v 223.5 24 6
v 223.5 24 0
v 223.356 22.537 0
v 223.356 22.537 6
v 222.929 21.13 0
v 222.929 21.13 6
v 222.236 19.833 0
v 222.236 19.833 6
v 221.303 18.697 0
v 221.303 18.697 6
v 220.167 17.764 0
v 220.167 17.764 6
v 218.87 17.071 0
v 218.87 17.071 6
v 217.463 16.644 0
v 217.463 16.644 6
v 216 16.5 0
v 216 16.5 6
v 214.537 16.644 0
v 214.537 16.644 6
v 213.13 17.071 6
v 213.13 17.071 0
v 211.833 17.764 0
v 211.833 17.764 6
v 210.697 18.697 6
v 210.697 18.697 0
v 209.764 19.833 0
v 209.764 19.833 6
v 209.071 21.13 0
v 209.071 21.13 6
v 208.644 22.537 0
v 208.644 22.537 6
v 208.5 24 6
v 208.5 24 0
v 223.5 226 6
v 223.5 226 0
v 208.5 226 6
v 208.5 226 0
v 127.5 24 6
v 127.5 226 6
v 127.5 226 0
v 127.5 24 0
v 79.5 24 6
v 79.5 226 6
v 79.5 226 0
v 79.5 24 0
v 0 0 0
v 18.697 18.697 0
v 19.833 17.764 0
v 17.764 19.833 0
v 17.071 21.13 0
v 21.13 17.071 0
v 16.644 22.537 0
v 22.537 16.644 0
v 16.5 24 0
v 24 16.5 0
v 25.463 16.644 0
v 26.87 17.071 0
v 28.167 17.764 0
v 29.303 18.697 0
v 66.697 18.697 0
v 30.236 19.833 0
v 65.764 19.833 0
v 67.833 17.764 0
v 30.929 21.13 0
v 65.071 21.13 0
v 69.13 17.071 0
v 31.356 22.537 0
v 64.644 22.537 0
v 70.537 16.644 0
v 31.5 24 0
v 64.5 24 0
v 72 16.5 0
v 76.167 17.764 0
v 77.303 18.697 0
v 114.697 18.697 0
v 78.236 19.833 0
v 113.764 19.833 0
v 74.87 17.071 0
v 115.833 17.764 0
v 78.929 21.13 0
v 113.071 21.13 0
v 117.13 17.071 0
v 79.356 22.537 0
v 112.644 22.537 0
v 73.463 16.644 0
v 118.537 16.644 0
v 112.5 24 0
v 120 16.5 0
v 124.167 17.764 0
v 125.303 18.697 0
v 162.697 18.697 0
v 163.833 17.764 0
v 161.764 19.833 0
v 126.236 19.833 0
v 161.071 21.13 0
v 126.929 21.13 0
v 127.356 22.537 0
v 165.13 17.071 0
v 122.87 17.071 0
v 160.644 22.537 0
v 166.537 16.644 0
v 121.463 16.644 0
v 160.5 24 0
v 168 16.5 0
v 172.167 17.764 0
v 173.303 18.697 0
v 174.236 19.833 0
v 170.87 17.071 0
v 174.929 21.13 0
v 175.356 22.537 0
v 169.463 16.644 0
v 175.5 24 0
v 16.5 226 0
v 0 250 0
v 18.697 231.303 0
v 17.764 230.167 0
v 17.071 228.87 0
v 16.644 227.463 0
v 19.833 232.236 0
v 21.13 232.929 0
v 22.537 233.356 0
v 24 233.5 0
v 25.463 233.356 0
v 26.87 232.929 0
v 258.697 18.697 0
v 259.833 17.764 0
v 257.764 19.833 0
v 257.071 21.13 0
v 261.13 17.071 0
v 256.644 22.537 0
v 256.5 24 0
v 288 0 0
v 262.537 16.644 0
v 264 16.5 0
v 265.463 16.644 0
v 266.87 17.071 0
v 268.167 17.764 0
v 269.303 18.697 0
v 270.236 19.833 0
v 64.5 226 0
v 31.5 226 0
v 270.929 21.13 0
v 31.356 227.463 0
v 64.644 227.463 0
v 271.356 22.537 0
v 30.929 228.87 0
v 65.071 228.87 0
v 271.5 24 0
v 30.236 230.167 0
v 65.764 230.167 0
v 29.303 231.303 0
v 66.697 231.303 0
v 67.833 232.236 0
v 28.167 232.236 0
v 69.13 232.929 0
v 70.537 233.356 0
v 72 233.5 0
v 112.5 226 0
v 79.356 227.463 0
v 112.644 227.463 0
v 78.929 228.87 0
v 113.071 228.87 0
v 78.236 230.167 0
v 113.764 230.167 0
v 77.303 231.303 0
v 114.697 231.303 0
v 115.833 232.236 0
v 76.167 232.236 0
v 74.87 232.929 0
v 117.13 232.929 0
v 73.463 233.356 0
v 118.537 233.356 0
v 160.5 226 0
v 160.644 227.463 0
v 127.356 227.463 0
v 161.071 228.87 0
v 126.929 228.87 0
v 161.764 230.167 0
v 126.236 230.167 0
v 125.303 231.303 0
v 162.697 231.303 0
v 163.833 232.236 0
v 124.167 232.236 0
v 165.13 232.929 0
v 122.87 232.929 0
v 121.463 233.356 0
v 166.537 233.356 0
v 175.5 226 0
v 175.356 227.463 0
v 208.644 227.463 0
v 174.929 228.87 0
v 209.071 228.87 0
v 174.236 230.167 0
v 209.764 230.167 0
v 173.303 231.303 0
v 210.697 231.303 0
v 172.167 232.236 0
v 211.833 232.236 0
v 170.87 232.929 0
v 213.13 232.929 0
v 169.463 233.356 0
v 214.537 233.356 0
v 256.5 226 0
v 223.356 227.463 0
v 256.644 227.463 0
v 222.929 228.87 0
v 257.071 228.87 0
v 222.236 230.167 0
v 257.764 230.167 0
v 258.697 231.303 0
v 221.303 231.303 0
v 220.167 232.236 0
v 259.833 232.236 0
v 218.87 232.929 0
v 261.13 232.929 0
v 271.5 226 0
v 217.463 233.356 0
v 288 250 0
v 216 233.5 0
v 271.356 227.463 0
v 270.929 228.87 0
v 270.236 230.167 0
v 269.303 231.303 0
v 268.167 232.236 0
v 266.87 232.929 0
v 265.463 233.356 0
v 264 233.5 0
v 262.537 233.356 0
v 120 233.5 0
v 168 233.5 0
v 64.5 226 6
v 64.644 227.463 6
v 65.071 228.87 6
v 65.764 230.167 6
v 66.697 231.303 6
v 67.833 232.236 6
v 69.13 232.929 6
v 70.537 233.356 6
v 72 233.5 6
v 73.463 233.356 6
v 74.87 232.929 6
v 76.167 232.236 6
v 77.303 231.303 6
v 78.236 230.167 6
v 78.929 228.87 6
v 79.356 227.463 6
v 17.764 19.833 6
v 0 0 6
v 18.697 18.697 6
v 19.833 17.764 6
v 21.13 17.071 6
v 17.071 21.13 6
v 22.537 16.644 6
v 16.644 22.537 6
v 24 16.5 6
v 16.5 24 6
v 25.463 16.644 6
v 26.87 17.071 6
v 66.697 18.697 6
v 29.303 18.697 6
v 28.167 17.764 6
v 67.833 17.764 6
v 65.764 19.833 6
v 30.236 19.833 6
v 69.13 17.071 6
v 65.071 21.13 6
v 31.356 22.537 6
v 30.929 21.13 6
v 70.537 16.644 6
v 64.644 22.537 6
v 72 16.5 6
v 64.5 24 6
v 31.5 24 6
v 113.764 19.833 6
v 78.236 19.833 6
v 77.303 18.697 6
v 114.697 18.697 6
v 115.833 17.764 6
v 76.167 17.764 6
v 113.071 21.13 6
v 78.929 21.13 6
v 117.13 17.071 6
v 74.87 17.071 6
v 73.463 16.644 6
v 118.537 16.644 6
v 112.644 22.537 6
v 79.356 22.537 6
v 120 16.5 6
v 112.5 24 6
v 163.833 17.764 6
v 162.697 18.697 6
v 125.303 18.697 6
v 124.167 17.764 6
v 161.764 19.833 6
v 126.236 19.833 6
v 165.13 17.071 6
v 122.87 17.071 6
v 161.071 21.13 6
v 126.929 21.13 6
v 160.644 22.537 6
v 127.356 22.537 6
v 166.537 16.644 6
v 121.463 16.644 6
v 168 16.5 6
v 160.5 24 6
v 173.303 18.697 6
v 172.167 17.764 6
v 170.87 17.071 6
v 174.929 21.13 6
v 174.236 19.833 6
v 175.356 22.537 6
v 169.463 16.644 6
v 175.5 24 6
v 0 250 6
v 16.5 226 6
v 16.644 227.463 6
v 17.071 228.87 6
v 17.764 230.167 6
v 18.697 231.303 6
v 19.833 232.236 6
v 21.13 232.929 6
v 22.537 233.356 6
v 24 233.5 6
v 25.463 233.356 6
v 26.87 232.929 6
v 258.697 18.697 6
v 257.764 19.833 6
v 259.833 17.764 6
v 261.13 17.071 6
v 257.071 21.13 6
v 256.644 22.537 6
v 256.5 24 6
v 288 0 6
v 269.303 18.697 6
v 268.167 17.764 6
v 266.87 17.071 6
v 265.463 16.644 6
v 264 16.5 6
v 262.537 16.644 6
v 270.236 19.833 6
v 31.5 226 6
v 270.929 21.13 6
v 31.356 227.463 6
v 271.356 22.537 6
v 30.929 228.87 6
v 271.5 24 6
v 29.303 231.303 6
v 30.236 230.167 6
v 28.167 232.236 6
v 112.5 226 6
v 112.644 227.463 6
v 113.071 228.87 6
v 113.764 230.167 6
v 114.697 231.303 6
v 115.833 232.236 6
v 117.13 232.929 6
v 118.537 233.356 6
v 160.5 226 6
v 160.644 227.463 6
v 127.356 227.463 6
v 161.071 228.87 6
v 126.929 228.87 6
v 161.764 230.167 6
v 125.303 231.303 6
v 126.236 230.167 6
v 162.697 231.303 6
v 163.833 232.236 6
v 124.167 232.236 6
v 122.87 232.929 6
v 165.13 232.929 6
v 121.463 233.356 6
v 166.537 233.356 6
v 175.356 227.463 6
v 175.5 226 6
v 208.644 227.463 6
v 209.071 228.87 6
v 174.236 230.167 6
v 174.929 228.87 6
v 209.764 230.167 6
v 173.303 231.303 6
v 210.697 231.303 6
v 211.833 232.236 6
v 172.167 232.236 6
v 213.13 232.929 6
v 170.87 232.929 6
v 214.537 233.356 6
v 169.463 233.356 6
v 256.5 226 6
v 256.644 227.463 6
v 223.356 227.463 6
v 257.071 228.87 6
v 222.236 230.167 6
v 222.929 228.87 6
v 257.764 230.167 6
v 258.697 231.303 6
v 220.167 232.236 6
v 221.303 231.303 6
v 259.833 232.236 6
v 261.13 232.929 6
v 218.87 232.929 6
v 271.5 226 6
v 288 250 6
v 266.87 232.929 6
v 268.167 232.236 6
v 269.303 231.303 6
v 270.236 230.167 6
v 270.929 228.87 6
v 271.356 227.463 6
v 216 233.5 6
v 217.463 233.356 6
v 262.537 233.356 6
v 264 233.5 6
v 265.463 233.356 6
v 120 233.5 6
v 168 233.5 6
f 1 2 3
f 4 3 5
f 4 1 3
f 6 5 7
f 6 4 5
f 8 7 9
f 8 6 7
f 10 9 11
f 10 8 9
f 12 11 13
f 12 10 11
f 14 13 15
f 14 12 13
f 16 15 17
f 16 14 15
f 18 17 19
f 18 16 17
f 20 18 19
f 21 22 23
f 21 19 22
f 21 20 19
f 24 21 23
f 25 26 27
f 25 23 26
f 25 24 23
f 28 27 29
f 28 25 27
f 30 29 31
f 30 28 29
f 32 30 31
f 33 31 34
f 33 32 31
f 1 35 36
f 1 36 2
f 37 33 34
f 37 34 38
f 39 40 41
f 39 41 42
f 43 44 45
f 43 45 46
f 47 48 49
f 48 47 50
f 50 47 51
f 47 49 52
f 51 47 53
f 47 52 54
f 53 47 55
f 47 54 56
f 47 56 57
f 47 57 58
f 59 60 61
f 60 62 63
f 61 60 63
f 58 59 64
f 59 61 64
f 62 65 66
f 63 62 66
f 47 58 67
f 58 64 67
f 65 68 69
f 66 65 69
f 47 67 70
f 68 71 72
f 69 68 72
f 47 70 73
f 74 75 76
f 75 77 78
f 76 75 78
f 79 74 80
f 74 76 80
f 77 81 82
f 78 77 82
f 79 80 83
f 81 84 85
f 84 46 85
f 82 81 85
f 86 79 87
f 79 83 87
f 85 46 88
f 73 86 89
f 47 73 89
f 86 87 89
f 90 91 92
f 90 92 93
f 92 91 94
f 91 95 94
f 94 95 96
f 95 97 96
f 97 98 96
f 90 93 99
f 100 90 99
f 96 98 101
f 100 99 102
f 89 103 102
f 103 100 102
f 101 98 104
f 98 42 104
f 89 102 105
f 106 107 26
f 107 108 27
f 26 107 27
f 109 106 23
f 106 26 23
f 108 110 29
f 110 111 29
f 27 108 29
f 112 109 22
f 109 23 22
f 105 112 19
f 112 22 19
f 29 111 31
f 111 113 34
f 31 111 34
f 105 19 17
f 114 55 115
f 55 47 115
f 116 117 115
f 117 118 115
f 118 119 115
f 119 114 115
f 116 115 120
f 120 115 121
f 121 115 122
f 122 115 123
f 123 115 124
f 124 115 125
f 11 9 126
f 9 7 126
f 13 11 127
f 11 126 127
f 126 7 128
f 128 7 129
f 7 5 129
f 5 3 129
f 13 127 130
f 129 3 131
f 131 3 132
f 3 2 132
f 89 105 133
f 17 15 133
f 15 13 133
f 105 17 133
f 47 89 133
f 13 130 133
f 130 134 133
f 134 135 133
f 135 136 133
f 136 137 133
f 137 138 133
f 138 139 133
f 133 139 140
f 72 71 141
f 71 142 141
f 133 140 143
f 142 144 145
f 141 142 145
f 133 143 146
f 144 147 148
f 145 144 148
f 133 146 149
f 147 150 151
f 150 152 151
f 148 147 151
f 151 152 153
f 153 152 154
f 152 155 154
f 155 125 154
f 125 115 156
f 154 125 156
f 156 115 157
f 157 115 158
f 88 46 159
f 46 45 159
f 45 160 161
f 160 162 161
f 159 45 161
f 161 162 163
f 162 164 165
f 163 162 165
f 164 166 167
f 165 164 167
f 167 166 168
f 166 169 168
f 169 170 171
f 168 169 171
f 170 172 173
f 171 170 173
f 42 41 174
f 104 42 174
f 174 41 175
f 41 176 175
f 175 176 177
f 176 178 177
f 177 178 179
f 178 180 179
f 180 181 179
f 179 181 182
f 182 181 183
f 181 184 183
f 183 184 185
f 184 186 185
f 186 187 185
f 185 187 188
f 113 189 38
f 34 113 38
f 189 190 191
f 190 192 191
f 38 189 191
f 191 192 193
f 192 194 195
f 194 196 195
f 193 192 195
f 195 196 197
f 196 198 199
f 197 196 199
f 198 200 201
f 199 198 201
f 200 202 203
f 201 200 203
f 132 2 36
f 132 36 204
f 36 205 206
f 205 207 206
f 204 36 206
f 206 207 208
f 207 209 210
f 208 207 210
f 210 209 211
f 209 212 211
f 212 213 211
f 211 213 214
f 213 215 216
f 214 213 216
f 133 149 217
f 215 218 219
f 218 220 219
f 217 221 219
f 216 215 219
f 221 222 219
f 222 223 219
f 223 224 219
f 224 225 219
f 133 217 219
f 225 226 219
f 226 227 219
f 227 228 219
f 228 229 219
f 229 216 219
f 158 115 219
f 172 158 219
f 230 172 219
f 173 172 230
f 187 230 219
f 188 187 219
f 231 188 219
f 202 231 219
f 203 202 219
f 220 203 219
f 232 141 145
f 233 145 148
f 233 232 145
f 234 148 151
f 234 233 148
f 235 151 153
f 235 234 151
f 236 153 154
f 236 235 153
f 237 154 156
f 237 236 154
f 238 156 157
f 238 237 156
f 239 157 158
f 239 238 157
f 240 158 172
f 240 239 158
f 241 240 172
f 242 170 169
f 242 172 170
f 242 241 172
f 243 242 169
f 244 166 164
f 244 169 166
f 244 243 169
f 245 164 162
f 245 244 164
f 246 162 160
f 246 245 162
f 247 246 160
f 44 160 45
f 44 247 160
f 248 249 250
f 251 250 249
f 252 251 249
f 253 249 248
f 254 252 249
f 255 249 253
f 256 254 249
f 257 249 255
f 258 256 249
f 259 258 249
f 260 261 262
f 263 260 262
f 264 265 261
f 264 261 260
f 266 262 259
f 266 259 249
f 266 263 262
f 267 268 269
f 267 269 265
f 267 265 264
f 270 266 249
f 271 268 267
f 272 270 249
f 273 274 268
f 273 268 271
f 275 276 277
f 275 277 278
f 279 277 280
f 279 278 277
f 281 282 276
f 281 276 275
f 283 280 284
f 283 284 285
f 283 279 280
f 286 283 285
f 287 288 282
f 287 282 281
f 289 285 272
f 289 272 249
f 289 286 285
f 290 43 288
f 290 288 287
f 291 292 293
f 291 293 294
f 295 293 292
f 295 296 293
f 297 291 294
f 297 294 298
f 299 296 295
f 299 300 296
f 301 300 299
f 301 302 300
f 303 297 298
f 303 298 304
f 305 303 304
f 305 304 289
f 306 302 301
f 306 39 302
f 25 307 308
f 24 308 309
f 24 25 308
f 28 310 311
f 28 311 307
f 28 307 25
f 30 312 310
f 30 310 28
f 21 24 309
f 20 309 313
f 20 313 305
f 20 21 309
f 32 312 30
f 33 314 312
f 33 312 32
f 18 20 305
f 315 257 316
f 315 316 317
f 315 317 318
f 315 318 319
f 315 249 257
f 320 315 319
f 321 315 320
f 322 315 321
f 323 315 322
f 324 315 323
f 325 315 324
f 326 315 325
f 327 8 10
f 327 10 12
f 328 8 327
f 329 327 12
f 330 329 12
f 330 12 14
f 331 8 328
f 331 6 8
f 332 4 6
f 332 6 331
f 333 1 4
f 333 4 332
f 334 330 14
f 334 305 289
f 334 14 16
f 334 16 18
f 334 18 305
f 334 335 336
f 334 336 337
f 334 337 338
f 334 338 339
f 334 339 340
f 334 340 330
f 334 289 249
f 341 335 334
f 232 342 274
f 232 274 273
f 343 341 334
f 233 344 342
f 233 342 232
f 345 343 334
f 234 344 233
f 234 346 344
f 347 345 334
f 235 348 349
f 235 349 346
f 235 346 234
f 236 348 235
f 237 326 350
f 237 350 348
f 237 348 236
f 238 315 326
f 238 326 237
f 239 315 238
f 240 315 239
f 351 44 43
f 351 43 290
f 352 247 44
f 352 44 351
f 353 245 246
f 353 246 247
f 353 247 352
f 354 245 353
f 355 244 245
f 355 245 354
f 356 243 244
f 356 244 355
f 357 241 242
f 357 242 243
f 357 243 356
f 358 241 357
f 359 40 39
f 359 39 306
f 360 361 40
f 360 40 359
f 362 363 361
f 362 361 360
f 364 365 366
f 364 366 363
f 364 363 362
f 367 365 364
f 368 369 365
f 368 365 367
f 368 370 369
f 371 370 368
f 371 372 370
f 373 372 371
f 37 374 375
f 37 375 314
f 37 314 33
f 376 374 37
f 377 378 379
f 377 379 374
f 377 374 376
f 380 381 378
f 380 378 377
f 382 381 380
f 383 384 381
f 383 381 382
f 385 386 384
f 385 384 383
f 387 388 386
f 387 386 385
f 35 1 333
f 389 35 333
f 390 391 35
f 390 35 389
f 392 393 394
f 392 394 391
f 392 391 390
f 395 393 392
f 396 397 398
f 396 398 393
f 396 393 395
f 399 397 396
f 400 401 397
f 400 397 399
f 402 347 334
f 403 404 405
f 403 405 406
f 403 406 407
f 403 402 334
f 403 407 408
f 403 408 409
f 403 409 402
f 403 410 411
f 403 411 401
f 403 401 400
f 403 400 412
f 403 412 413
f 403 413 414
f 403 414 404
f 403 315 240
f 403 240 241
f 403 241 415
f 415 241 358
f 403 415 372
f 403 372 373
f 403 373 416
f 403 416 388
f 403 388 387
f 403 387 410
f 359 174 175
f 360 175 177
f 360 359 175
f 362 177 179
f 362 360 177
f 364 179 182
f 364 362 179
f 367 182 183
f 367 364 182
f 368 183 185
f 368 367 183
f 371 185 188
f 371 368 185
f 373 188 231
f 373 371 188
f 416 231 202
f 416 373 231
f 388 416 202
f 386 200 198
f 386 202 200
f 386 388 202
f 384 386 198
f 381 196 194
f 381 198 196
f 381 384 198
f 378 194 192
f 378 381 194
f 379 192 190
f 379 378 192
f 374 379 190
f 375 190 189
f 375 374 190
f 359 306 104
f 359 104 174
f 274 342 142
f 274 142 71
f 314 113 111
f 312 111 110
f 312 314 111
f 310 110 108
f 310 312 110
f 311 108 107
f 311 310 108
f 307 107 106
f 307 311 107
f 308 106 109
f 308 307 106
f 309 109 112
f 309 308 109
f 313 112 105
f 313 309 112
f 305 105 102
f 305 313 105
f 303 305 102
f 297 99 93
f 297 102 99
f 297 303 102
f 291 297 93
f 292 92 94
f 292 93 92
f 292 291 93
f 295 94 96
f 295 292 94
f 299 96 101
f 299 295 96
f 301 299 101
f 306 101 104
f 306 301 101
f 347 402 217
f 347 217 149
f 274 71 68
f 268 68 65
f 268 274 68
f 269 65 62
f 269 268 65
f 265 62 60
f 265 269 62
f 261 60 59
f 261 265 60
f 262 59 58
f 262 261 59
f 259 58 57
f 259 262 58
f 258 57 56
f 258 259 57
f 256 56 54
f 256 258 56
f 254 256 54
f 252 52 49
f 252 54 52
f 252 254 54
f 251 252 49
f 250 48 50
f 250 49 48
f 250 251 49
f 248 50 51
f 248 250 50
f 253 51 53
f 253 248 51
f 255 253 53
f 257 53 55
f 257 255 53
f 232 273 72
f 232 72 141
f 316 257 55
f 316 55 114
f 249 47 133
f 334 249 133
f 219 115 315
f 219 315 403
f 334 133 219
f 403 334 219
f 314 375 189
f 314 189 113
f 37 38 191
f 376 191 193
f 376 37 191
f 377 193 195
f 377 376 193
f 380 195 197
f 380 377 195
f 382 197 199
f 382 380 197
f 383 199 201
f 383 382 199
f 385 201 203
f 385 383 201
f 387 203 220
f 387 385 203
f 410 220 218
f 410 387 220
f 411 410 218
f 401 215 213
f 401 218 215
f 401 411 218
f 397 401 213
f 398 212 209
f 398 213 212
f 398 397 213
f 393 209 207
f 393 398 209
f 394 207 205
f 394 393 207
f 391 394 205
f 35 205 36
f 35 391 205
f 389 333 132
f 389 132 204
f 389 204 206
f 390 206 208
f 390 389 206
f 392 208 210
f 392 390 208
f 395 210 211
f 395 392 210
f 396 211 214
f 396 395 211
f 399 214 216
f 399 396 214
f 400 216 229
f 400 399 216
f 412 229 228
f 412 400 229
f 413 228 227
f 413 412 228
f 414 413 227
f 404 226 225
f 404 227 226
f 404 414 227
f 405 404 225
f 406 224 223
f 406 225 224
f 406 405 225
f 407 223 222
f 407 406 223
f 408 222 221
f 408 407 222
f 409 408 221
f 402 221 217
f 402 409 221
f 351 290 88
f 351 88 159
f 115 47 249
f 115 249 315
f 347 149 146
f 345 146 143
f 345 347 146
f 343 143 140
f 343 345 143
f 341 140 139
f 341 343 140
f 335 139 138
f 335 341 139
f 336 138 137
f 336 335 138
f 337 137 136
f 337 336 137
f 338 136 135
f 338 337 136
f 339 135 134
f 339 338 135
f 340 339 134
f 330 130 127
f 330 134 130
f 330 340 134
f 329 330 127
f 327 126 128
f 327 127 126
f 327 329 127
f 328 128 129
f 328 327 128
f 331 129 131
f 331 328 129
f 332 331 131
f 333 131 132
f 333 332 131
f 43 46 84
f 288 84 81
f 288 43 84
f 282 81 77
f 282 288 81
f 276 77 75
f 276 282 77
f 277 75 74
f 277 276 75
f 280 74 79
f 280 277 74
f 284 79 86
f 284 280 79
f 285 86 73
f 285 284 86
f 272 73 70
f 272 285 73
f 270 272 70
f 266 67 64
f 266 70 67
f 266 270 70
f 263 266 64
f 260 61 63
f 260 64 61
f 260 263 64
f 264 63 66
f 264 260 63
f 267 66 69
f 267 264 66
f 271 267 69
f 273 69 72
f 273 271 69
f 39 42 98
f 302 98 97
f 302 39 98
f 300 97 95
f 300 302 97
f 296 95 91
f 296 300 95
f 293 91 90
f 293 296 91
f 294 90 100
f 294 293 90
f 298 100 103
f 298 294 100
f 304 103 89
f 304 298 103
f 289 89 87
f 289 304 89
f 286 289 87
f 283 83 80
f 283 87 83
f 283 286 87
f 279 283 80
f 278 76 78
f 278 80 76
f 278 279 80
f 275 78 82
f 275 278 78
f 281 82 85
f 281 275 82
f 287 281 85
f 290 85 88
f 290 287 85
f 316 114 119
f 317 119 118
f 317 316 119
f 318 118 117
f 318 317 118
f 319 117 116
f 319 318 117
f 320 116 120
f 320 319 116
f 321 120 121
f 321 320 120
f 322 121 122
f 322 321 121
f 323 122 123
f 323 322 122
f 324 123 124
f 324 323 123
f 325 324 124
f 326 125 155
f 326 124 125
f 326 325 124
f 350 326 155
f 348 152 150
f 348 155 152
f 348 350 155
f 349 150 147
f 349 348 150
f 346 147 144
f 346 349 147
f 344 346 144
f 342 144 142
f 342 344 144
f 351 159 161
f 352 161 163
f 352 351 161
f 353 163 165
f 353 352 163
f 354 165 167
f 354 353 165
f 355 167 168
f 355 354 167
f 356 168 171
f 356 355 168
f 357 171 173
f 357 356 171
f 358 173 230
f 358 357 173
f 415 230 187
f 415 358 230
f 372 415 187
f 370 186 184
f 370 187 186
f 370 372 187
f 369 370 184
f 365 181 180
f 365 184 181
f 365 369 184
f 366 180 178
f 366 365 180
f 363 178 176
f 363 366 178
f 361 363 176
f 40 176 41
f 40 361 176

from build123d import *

# Parameters (mm, degrees)
SKETCH1_W           = 288
SKETCH1_H           = 250
BOSS_EXTRUDE1_DEPTH = 6
CUT_EXTRUDE1_DEPTH  = 7
LPATTERN4_COUNT     = 6
LPATTERN4_PITCH     = 48


with BuildPart() as part:
    # Sketch1 → Boss-Extrude1 (new body)
    with BuildSketch(Plane.XY):
        with Locations((144, 125)):
            Rectangle(SKETCH1_W, SKETCH1_H)
    extrude(amount=BOSS_EXTRUDE1_DEPTH)

    # Sketch2 → Cut-Extrude1 (cut, through all)
    with BuildSketch(Plane.XY.offset(6)):
        with BuildLine():
            Line((16.5, 24), (16.5, 226))
            ThreePointArc((16.5, 226), (24, 233.5), (31.5, 226))
            Line((31.5, 226), (31.5, 24))
            ThreePointArc((31.5, 24), (24, 16.5), (16.5, 24))
        make_face()
    cut_extrude1 = extrude(amount=-CUT_EXTRUDE1_DEPTH, mode=Mode.SUBTRACT)

    # LPattern4: Cut-Extrude1 ×6
    with Locations(*[(i * LPATTERN4_PITCH, 0, 0) for i in range(1, LPATTERN4_COUNT)]):
        add(cut_extrude1, mode=Mode.SUBTRACT)


solid = part.part
